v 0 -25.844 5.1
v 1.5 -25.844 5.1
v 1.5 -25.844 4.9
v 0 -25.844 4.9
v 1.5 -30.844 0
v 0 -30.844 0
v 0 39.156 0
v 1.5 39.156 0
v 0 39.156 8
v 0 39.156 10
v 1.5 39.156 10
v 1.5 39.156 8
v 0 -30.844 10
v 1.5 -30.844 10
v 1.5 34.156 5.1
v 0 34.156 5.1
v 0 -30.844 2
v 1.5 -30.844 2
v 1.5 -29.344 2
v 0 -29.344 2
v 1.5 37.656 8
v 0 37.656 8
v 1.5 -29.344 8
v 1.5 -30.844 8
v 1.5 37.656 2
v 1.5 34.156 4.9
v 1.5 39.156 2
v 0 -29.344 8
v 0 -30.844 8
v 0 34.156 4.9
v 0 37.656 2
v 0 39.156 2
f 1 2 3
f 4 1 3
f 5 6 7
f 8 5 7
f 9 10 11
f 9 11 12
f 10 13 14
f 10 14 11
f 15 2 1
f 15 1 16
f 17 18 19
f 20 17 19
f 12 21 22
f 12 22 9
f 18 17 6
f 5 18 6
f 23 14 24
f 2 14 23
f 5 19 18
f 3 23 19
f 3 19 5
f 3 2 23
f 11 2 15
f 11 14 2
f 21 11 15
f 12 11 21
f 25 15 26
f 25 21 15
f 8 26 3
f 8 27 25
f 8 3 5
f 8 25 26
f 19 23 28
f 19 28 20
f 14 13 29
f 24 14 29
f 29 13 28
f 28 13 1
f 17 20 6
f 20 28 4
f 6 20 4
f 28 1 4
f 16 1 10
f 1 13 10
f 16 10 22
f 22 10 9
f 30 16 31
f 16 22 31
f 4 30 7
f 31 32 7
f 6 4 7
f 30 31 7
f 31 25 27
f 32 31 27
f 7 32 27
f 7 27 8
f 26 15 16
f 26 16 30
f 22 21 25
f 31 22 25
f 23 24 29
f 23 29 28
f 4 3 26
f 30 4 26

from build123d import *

# Parameters (mm, degrees)
SKETCH1_W           = 10
SKETCH1_H           = 70
BOSS_EXTRUDE1_DEPTH = 1.5
SKETCH3_W           = 0.2
SKETCH3_H           = 60
CUT_EXTRUDE2_DEPTH  = 10
SKETCH4_W           = 6
SKETCH4_H           = 1.5
CUT_EXTRUDE3_DEPTH  = 10


with BuildPart() as part:
    # Sketch1 → Boss-Extrude1 (new body)
    with BuildSketch(Plane(origin=(0, 0, 0), x_dir=(0, 0, -1), z_dir=(1, 0, 0))):
        with Locations((-5, 4.155844156)):
            Rectangle(SKETCH1_W, SKETCH1_H)
    extrude(amount=BOSS_EXTRUDE1_DEPTH)

    # Sketch3 → Cut-Extrude2 (cut)
    with BuildSketch(Plane(origin=(1.5, 0, 0), x_dir=(0, 0, -1), z_dir=(1, 0, 0))):
        with Locations((-5, 4.155844156)):
            Rectangle(SKETCH3_W, SKETCH3_H)
    extrude(amount=-CUT_EXTRUDE2_DEPTH, mode=Mode.SUBTRACT)

    # Sketch4 → Cut-Extrude3 (cut)
    with BuildSketch(Plane(origin=(1.5, 0, 0), x_dir=(0, 0, -1), z_dir=(1, 0, 0))):
        with Locations((-5, 38.405844156)):
            Rectangle(SKETCH4_W, SKETCH4_H)
        with Locations((-5, -30.094155844)):
            Rectangle(SKETCH4_W, SKETCH4_H)
    extrude(amount=-CUT_EXTRUDE3_DEPTH, mode=Mode.SUBTRACT)


solid = part.part
